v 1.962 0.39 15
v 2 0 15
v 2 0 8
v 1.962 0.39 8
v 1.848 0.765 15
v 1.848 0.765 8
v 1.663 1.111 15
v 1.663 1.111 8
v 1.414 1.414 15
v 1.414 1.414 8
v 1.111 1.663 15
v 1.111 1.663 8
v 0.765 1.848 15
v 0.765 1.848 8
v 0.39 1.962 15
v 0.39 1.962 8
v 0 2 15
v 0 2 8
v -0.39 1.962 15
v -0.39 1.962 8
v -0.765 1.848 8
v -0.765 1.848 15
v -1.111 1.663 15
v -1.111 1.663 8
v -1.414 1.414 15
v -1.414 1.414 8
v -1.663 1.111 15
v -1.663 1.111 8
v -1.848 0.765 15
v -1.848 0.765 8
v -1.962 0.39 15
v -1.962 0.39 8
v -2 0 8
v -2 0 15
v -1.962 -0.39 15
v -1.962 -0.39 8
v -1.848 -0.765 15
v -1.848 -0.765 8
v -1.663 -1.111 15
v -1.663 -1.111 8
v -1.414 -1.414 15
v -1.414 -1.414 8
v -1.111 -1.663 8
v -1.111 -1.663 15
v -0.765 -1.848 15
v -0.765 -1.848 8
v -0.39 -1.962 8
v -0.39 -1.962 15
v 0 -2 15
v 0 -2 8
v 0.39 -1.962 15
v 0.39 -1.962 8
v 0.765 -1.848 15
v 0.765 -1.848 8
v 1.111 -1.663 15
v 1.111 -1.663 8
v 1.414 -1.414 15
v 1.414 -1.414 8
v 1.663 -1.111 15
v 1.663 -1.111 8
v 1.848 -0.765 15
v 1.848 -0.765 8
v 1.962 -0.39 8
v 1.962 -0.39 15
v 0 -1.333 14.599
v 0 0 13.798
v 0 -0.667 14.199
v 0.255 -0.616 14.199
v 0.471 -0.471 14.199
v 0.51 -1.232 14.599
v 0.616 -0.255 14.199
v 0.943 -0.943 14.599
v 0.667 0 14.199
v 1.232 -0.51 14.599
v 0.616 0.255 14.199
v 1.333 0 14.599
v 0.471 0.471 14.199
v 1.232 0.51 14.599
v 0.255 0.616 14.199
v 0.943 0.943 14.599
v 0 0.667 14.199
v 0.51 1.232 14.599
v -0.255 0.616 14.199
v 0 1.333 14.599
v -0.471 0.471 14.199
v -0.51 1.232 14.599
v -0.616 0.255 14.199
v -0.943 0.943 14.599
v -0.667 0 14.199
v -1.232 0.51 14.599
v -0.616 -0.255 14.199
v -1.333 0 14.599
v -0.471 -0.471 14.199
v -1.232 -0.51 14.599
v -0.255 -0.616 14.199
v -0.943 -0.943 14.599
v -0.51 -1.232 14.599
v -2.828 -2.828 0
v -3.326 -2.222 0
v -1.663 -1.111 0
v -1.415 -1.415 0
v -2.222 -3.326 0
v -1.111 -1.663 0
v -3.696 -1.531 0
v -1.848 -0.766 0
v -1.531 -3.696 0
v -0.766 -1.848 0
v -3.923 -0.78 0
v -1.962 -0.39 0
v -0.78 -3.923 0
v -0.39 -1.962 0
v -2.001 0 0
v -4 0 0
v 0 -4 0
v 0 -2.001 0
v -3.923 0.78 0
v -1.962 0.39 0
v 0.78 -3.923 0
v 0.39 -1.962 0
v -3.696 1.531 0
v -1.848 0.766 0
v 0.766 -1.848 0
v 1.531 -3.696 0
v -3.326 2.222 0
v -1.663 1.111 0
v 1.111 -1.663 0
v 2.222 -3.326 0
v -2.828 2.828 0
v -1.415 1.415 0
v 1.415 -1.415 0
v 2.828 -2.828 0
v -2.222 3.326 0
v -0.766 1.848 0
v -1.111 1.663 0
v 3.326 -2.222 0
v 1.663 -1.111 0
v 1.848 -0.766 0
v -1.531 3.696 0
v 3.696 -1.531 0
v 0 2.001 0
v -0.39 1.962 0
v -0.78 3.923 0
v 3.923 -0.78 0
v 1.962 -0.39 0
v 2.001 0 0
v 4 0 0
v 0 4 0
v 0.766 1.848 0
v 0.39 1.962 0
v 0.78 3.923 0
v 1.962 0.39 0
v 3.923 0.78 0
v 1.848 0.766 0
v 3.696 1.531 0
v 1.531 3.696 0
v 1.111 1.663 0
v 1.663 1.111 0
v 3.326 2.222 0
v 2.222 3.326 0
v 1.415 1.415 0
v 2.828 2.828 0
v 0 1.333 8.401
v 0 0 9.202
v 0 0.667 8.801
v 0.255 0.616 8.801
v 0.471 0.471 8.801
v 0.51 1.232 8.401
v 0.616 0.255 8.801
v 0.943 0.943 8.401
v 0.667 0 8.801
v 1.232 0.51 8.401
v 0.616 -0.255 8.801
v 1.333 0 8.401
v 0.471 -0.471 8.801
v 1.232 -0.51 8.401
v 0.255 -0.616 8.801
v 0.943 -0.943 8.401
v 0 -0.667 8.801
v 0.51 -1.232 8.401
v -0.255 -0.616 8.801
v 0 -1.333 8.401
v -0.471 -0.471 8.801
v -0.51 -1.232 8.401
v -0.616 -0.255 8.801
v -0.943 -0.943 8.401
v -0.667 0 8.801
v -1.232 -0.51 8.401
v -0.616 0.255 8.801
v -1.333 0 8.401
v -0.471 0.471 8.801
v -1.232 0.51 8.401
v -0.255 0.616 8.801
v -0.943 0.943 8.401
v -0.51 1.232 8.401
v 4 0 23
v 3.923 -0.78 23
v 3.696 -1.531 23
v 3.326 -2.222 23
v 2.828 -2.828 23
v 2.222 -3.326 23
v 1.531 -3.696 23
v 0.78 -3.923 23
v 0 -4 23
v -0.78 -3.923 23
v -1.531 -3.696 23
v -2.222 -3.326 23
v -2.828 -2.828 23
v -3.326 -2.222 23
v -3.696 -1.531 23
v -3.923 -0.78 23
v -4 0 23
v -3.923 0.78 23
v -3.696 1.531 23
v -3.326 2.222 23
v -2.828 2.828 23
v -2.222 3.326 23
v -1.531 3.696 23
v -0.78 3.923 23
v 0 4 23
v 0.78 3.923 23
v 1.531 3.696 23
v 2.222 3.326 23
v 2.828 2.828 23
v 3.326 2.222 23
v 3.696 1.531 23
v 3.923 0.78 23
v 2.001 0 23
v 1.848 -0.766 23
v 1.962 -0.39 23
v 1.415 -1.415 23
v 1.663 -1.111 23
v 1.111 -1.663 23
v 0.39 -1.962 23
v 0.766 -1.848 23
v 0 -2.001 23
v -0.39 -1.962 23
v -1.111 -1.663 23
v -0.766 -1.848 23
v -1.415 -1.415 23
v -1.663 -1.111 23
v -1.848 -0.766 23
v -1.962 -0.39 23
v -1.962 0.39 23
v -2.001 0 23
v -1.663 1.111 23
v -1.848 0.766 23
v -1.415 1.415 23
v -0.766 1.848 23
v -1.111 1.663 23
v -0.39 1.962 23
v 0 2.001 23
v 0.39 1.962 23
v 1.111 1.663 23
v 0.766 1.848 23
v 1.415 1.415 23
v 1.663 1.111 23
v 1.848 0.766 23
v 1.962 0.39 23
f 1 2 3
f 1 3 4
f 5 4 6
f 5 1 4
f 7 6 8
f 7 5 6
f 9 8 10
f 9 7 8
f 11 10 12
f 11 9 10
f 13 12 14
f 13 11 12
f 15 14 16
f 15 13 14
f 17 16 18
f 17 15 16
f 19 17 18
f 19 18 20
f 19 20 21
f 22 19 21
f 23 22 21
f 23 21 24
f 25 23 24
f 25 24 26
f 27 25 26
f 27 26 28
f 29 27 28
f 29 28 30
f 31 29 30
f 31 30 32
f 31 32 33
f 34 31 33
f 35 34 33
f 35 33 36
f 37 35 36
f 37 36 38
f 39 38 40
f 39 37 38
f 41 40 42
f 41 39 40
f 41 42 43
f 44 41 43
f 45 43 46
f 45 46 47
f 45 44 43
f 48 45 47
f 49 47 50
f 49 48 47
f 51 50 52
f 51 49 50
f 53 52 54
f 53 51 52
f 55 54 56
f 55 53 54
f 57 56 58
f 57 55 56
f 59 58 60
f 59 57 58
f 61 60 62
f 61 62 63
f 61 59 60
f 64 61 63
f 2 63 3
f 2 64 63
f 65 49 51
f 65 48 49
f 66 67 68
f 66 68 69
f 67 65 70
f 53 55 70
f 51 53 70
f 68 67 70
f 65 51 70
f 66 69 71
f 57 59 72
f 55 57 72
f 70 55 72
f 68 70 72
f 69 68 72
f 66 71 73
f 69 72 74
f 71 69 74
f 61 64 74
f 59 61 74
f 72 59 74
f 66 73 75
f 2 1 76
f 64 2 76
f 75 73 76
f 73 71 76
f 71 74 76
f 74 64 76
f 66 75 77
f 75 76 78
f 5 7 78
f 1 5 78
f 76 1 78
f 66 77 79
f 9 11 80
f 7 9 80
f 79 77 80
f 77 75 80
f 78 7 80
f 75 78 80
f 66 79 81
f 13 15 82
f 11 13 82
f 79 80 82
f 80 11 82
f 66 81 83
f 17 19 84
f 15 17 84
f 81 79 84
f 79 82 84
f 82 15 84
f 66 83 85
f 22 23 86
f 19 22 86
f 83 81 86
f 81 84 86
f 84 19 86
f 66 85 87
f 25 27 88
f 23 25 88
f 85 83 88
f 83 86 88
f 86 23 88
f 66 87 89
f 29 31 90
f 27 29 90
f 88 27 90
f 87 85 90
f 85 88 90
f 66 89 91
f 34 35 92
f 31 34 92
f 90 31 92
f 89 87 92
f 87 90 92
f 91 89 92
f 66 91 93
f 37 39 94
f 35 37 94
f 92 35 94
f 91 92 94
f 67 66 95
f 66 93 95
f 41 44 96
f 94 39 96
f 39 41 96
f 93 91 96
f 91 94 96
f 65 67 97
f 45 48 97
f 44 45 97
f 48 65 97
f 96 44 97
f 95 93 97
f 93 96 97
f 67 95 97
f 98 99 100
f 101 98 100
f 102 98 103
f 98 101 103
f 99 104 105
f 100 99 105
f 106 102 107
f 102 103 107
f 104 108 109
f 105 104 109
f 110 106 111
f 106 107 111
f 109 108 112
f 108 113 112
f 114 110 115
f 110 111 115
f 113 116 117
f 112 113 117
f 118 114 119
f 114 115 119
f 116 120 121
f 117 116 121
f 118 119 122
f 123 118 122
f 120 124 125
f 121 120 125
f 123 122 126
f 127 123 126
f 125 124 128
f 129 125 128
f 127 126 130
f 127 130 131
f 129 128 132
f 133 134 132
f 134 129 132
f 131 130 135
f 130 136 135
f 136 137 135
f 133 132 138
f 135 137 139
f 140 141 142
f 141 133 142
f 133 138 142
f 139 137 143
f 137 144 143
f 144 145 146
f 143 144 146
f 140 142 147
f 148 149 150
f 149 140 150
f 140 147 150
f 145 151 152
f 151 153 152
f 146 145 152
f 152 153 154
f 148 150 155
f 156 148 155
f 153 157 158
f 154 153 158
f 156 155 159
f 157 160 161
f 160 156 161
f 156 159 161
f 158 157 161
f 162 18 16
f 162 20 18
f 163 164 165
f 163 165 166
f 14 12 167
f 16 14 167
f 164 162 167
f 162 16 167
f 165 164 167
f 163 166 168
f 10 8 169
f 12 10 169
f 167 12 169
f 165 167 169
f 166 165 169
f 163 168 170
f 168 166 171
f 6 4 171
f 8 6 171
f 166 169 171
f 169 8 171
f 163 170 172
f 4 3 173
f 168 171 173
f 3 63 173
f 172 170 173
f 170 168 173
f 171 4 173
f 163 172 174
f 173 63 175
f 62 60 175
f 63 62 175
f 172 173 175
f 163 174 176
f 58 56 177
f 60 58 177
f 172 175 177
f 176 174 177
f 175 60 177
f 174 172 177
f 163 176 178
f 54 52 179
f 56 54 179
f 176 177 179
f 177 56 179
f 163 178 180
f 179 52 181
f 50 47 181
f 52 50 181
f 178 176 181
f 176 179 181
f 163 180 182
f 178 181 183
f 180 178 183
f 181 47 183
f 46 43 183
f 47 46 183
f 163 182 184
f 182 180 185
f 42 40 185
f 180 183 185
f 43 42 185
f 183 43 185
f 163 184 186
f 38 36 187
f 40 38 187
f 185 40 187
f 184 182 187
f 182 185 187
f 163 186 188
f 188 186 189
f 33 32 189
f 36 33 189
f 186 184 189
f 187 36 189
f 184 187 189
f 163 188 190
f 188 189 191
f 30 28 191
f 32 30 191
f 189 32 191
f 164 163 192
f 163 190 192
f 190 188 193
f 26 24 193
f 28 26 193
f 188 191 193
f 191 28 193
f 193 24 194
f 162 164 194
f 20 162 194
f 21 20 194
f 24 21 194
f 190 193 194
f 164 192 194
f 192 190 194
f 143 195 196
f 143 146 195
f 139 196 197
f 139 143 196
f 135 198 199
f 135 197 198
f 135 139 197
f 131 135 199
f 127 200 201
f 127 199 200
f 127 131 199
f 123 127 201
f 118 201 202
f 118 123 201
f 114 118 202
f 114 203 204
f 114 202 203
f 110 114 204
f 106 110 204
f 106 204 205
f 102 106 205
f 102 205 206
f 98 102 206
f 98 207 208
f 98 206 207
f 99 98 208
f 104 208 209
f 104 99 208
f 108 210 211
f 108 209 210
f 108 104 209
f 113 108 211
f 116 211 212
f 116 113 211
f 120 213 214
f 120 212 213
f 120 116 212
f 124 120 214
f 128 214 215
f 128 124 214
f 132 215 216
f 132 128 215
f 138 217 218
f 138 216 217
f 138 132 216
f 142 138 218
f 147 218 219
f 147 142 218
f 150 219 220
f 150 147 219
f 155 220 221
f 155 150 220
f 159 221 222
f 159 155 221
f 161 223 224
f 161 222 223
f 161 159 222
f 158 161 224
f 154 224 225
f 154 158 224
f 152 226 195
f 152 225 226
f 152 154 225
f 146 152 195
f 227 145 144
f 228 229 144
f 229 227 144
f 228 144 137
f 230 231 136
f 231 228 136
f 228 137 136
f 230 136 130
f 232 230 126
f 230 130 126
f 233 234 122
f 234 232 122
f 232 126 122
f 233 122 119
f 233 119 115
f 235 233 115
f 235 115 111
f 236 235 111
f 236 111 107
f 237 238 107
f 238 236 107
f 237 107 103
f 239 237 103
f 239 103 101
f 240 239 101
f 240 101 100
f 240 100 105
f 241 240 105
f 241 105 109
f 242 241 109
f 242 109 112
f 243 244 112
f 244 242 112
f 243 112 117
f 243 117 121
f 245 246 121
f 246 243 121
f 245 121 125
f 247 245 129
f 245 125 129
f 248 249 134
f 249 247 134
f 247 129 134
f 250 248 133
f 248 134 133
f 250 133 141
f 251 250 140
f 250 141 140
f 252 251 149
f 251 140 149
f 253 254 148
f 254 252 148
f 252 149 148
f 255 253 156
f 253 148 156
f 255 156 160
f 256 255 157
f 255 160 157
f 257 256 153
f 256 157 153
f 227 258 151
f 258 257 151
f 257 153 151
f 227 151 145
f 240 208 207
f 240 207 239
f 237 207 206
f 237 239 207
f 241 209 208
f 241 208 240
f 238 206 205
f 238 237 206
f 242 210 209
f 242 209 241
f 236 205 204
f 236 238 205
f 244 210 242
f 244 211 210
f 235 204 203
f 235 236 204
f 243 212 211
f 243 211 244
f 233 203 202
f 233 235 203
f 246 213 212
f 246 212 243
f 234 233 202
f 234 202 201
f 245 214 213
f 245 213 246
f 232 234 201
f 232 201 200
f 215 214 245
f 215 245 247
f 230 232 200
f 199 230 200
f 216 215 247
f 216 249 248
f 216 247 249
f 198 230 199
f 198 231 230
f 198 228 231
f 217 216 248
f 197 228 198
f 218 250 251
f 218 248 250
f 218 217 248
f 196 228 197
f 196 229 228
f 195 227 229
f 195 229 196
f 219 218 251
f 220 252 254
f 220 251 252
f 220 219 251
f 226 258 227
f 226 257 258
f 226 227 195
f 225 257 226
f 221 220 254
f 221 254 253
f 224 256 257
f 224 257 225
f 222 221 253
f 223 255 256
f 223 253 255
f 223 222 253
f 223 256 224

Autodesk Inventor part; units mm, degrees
ref_plane "YZ Plane" through (0, 0, 0) normal (1, 0, 0) x (0, 1, 0)
ref_plane "XZ Plane" through (0, 0, 0) normal (0, 1, 0) x (-1, 0, 0)
ref_plane "XY Plane" through (0, 0, 0) normal (0, 0, 1) x (1, 0, 0)
sketch "スケッチ1" plane through (0, 0, 0) normal (0, 0, 1) x (1, 0, 0)
  circle A0 centre (0, 0) radius 4
  circle A1 centre (0, 0) radius 2.0005
  dimension "d0" = 8
  dimension "d1" = 4.001
extrude "押し出し1" add sketch "スケッチ1" along normal blind 23
sketch "スケッチ2" plane through (0, 0, 23) normal (0, 0, 1) x (1, 0, 0)
  circle A0 centre (0, 0) radius 2
  dimension "d4" = 4
extrude "押し出し2" add sketch "スケッチ2" against normal blind 23
hole "穴1" at (0, 0, 23) direction (0, 0, -1) diameter 4 depth 8 tip angle 118
hole "穴2" at (0, 0, 0) direction (0, 0, 1) diameter 4 depth 8 tip angle 118
properties part number "スペーサーm4-23　簡易筒型" material "アルミニウム 2014-T4"
